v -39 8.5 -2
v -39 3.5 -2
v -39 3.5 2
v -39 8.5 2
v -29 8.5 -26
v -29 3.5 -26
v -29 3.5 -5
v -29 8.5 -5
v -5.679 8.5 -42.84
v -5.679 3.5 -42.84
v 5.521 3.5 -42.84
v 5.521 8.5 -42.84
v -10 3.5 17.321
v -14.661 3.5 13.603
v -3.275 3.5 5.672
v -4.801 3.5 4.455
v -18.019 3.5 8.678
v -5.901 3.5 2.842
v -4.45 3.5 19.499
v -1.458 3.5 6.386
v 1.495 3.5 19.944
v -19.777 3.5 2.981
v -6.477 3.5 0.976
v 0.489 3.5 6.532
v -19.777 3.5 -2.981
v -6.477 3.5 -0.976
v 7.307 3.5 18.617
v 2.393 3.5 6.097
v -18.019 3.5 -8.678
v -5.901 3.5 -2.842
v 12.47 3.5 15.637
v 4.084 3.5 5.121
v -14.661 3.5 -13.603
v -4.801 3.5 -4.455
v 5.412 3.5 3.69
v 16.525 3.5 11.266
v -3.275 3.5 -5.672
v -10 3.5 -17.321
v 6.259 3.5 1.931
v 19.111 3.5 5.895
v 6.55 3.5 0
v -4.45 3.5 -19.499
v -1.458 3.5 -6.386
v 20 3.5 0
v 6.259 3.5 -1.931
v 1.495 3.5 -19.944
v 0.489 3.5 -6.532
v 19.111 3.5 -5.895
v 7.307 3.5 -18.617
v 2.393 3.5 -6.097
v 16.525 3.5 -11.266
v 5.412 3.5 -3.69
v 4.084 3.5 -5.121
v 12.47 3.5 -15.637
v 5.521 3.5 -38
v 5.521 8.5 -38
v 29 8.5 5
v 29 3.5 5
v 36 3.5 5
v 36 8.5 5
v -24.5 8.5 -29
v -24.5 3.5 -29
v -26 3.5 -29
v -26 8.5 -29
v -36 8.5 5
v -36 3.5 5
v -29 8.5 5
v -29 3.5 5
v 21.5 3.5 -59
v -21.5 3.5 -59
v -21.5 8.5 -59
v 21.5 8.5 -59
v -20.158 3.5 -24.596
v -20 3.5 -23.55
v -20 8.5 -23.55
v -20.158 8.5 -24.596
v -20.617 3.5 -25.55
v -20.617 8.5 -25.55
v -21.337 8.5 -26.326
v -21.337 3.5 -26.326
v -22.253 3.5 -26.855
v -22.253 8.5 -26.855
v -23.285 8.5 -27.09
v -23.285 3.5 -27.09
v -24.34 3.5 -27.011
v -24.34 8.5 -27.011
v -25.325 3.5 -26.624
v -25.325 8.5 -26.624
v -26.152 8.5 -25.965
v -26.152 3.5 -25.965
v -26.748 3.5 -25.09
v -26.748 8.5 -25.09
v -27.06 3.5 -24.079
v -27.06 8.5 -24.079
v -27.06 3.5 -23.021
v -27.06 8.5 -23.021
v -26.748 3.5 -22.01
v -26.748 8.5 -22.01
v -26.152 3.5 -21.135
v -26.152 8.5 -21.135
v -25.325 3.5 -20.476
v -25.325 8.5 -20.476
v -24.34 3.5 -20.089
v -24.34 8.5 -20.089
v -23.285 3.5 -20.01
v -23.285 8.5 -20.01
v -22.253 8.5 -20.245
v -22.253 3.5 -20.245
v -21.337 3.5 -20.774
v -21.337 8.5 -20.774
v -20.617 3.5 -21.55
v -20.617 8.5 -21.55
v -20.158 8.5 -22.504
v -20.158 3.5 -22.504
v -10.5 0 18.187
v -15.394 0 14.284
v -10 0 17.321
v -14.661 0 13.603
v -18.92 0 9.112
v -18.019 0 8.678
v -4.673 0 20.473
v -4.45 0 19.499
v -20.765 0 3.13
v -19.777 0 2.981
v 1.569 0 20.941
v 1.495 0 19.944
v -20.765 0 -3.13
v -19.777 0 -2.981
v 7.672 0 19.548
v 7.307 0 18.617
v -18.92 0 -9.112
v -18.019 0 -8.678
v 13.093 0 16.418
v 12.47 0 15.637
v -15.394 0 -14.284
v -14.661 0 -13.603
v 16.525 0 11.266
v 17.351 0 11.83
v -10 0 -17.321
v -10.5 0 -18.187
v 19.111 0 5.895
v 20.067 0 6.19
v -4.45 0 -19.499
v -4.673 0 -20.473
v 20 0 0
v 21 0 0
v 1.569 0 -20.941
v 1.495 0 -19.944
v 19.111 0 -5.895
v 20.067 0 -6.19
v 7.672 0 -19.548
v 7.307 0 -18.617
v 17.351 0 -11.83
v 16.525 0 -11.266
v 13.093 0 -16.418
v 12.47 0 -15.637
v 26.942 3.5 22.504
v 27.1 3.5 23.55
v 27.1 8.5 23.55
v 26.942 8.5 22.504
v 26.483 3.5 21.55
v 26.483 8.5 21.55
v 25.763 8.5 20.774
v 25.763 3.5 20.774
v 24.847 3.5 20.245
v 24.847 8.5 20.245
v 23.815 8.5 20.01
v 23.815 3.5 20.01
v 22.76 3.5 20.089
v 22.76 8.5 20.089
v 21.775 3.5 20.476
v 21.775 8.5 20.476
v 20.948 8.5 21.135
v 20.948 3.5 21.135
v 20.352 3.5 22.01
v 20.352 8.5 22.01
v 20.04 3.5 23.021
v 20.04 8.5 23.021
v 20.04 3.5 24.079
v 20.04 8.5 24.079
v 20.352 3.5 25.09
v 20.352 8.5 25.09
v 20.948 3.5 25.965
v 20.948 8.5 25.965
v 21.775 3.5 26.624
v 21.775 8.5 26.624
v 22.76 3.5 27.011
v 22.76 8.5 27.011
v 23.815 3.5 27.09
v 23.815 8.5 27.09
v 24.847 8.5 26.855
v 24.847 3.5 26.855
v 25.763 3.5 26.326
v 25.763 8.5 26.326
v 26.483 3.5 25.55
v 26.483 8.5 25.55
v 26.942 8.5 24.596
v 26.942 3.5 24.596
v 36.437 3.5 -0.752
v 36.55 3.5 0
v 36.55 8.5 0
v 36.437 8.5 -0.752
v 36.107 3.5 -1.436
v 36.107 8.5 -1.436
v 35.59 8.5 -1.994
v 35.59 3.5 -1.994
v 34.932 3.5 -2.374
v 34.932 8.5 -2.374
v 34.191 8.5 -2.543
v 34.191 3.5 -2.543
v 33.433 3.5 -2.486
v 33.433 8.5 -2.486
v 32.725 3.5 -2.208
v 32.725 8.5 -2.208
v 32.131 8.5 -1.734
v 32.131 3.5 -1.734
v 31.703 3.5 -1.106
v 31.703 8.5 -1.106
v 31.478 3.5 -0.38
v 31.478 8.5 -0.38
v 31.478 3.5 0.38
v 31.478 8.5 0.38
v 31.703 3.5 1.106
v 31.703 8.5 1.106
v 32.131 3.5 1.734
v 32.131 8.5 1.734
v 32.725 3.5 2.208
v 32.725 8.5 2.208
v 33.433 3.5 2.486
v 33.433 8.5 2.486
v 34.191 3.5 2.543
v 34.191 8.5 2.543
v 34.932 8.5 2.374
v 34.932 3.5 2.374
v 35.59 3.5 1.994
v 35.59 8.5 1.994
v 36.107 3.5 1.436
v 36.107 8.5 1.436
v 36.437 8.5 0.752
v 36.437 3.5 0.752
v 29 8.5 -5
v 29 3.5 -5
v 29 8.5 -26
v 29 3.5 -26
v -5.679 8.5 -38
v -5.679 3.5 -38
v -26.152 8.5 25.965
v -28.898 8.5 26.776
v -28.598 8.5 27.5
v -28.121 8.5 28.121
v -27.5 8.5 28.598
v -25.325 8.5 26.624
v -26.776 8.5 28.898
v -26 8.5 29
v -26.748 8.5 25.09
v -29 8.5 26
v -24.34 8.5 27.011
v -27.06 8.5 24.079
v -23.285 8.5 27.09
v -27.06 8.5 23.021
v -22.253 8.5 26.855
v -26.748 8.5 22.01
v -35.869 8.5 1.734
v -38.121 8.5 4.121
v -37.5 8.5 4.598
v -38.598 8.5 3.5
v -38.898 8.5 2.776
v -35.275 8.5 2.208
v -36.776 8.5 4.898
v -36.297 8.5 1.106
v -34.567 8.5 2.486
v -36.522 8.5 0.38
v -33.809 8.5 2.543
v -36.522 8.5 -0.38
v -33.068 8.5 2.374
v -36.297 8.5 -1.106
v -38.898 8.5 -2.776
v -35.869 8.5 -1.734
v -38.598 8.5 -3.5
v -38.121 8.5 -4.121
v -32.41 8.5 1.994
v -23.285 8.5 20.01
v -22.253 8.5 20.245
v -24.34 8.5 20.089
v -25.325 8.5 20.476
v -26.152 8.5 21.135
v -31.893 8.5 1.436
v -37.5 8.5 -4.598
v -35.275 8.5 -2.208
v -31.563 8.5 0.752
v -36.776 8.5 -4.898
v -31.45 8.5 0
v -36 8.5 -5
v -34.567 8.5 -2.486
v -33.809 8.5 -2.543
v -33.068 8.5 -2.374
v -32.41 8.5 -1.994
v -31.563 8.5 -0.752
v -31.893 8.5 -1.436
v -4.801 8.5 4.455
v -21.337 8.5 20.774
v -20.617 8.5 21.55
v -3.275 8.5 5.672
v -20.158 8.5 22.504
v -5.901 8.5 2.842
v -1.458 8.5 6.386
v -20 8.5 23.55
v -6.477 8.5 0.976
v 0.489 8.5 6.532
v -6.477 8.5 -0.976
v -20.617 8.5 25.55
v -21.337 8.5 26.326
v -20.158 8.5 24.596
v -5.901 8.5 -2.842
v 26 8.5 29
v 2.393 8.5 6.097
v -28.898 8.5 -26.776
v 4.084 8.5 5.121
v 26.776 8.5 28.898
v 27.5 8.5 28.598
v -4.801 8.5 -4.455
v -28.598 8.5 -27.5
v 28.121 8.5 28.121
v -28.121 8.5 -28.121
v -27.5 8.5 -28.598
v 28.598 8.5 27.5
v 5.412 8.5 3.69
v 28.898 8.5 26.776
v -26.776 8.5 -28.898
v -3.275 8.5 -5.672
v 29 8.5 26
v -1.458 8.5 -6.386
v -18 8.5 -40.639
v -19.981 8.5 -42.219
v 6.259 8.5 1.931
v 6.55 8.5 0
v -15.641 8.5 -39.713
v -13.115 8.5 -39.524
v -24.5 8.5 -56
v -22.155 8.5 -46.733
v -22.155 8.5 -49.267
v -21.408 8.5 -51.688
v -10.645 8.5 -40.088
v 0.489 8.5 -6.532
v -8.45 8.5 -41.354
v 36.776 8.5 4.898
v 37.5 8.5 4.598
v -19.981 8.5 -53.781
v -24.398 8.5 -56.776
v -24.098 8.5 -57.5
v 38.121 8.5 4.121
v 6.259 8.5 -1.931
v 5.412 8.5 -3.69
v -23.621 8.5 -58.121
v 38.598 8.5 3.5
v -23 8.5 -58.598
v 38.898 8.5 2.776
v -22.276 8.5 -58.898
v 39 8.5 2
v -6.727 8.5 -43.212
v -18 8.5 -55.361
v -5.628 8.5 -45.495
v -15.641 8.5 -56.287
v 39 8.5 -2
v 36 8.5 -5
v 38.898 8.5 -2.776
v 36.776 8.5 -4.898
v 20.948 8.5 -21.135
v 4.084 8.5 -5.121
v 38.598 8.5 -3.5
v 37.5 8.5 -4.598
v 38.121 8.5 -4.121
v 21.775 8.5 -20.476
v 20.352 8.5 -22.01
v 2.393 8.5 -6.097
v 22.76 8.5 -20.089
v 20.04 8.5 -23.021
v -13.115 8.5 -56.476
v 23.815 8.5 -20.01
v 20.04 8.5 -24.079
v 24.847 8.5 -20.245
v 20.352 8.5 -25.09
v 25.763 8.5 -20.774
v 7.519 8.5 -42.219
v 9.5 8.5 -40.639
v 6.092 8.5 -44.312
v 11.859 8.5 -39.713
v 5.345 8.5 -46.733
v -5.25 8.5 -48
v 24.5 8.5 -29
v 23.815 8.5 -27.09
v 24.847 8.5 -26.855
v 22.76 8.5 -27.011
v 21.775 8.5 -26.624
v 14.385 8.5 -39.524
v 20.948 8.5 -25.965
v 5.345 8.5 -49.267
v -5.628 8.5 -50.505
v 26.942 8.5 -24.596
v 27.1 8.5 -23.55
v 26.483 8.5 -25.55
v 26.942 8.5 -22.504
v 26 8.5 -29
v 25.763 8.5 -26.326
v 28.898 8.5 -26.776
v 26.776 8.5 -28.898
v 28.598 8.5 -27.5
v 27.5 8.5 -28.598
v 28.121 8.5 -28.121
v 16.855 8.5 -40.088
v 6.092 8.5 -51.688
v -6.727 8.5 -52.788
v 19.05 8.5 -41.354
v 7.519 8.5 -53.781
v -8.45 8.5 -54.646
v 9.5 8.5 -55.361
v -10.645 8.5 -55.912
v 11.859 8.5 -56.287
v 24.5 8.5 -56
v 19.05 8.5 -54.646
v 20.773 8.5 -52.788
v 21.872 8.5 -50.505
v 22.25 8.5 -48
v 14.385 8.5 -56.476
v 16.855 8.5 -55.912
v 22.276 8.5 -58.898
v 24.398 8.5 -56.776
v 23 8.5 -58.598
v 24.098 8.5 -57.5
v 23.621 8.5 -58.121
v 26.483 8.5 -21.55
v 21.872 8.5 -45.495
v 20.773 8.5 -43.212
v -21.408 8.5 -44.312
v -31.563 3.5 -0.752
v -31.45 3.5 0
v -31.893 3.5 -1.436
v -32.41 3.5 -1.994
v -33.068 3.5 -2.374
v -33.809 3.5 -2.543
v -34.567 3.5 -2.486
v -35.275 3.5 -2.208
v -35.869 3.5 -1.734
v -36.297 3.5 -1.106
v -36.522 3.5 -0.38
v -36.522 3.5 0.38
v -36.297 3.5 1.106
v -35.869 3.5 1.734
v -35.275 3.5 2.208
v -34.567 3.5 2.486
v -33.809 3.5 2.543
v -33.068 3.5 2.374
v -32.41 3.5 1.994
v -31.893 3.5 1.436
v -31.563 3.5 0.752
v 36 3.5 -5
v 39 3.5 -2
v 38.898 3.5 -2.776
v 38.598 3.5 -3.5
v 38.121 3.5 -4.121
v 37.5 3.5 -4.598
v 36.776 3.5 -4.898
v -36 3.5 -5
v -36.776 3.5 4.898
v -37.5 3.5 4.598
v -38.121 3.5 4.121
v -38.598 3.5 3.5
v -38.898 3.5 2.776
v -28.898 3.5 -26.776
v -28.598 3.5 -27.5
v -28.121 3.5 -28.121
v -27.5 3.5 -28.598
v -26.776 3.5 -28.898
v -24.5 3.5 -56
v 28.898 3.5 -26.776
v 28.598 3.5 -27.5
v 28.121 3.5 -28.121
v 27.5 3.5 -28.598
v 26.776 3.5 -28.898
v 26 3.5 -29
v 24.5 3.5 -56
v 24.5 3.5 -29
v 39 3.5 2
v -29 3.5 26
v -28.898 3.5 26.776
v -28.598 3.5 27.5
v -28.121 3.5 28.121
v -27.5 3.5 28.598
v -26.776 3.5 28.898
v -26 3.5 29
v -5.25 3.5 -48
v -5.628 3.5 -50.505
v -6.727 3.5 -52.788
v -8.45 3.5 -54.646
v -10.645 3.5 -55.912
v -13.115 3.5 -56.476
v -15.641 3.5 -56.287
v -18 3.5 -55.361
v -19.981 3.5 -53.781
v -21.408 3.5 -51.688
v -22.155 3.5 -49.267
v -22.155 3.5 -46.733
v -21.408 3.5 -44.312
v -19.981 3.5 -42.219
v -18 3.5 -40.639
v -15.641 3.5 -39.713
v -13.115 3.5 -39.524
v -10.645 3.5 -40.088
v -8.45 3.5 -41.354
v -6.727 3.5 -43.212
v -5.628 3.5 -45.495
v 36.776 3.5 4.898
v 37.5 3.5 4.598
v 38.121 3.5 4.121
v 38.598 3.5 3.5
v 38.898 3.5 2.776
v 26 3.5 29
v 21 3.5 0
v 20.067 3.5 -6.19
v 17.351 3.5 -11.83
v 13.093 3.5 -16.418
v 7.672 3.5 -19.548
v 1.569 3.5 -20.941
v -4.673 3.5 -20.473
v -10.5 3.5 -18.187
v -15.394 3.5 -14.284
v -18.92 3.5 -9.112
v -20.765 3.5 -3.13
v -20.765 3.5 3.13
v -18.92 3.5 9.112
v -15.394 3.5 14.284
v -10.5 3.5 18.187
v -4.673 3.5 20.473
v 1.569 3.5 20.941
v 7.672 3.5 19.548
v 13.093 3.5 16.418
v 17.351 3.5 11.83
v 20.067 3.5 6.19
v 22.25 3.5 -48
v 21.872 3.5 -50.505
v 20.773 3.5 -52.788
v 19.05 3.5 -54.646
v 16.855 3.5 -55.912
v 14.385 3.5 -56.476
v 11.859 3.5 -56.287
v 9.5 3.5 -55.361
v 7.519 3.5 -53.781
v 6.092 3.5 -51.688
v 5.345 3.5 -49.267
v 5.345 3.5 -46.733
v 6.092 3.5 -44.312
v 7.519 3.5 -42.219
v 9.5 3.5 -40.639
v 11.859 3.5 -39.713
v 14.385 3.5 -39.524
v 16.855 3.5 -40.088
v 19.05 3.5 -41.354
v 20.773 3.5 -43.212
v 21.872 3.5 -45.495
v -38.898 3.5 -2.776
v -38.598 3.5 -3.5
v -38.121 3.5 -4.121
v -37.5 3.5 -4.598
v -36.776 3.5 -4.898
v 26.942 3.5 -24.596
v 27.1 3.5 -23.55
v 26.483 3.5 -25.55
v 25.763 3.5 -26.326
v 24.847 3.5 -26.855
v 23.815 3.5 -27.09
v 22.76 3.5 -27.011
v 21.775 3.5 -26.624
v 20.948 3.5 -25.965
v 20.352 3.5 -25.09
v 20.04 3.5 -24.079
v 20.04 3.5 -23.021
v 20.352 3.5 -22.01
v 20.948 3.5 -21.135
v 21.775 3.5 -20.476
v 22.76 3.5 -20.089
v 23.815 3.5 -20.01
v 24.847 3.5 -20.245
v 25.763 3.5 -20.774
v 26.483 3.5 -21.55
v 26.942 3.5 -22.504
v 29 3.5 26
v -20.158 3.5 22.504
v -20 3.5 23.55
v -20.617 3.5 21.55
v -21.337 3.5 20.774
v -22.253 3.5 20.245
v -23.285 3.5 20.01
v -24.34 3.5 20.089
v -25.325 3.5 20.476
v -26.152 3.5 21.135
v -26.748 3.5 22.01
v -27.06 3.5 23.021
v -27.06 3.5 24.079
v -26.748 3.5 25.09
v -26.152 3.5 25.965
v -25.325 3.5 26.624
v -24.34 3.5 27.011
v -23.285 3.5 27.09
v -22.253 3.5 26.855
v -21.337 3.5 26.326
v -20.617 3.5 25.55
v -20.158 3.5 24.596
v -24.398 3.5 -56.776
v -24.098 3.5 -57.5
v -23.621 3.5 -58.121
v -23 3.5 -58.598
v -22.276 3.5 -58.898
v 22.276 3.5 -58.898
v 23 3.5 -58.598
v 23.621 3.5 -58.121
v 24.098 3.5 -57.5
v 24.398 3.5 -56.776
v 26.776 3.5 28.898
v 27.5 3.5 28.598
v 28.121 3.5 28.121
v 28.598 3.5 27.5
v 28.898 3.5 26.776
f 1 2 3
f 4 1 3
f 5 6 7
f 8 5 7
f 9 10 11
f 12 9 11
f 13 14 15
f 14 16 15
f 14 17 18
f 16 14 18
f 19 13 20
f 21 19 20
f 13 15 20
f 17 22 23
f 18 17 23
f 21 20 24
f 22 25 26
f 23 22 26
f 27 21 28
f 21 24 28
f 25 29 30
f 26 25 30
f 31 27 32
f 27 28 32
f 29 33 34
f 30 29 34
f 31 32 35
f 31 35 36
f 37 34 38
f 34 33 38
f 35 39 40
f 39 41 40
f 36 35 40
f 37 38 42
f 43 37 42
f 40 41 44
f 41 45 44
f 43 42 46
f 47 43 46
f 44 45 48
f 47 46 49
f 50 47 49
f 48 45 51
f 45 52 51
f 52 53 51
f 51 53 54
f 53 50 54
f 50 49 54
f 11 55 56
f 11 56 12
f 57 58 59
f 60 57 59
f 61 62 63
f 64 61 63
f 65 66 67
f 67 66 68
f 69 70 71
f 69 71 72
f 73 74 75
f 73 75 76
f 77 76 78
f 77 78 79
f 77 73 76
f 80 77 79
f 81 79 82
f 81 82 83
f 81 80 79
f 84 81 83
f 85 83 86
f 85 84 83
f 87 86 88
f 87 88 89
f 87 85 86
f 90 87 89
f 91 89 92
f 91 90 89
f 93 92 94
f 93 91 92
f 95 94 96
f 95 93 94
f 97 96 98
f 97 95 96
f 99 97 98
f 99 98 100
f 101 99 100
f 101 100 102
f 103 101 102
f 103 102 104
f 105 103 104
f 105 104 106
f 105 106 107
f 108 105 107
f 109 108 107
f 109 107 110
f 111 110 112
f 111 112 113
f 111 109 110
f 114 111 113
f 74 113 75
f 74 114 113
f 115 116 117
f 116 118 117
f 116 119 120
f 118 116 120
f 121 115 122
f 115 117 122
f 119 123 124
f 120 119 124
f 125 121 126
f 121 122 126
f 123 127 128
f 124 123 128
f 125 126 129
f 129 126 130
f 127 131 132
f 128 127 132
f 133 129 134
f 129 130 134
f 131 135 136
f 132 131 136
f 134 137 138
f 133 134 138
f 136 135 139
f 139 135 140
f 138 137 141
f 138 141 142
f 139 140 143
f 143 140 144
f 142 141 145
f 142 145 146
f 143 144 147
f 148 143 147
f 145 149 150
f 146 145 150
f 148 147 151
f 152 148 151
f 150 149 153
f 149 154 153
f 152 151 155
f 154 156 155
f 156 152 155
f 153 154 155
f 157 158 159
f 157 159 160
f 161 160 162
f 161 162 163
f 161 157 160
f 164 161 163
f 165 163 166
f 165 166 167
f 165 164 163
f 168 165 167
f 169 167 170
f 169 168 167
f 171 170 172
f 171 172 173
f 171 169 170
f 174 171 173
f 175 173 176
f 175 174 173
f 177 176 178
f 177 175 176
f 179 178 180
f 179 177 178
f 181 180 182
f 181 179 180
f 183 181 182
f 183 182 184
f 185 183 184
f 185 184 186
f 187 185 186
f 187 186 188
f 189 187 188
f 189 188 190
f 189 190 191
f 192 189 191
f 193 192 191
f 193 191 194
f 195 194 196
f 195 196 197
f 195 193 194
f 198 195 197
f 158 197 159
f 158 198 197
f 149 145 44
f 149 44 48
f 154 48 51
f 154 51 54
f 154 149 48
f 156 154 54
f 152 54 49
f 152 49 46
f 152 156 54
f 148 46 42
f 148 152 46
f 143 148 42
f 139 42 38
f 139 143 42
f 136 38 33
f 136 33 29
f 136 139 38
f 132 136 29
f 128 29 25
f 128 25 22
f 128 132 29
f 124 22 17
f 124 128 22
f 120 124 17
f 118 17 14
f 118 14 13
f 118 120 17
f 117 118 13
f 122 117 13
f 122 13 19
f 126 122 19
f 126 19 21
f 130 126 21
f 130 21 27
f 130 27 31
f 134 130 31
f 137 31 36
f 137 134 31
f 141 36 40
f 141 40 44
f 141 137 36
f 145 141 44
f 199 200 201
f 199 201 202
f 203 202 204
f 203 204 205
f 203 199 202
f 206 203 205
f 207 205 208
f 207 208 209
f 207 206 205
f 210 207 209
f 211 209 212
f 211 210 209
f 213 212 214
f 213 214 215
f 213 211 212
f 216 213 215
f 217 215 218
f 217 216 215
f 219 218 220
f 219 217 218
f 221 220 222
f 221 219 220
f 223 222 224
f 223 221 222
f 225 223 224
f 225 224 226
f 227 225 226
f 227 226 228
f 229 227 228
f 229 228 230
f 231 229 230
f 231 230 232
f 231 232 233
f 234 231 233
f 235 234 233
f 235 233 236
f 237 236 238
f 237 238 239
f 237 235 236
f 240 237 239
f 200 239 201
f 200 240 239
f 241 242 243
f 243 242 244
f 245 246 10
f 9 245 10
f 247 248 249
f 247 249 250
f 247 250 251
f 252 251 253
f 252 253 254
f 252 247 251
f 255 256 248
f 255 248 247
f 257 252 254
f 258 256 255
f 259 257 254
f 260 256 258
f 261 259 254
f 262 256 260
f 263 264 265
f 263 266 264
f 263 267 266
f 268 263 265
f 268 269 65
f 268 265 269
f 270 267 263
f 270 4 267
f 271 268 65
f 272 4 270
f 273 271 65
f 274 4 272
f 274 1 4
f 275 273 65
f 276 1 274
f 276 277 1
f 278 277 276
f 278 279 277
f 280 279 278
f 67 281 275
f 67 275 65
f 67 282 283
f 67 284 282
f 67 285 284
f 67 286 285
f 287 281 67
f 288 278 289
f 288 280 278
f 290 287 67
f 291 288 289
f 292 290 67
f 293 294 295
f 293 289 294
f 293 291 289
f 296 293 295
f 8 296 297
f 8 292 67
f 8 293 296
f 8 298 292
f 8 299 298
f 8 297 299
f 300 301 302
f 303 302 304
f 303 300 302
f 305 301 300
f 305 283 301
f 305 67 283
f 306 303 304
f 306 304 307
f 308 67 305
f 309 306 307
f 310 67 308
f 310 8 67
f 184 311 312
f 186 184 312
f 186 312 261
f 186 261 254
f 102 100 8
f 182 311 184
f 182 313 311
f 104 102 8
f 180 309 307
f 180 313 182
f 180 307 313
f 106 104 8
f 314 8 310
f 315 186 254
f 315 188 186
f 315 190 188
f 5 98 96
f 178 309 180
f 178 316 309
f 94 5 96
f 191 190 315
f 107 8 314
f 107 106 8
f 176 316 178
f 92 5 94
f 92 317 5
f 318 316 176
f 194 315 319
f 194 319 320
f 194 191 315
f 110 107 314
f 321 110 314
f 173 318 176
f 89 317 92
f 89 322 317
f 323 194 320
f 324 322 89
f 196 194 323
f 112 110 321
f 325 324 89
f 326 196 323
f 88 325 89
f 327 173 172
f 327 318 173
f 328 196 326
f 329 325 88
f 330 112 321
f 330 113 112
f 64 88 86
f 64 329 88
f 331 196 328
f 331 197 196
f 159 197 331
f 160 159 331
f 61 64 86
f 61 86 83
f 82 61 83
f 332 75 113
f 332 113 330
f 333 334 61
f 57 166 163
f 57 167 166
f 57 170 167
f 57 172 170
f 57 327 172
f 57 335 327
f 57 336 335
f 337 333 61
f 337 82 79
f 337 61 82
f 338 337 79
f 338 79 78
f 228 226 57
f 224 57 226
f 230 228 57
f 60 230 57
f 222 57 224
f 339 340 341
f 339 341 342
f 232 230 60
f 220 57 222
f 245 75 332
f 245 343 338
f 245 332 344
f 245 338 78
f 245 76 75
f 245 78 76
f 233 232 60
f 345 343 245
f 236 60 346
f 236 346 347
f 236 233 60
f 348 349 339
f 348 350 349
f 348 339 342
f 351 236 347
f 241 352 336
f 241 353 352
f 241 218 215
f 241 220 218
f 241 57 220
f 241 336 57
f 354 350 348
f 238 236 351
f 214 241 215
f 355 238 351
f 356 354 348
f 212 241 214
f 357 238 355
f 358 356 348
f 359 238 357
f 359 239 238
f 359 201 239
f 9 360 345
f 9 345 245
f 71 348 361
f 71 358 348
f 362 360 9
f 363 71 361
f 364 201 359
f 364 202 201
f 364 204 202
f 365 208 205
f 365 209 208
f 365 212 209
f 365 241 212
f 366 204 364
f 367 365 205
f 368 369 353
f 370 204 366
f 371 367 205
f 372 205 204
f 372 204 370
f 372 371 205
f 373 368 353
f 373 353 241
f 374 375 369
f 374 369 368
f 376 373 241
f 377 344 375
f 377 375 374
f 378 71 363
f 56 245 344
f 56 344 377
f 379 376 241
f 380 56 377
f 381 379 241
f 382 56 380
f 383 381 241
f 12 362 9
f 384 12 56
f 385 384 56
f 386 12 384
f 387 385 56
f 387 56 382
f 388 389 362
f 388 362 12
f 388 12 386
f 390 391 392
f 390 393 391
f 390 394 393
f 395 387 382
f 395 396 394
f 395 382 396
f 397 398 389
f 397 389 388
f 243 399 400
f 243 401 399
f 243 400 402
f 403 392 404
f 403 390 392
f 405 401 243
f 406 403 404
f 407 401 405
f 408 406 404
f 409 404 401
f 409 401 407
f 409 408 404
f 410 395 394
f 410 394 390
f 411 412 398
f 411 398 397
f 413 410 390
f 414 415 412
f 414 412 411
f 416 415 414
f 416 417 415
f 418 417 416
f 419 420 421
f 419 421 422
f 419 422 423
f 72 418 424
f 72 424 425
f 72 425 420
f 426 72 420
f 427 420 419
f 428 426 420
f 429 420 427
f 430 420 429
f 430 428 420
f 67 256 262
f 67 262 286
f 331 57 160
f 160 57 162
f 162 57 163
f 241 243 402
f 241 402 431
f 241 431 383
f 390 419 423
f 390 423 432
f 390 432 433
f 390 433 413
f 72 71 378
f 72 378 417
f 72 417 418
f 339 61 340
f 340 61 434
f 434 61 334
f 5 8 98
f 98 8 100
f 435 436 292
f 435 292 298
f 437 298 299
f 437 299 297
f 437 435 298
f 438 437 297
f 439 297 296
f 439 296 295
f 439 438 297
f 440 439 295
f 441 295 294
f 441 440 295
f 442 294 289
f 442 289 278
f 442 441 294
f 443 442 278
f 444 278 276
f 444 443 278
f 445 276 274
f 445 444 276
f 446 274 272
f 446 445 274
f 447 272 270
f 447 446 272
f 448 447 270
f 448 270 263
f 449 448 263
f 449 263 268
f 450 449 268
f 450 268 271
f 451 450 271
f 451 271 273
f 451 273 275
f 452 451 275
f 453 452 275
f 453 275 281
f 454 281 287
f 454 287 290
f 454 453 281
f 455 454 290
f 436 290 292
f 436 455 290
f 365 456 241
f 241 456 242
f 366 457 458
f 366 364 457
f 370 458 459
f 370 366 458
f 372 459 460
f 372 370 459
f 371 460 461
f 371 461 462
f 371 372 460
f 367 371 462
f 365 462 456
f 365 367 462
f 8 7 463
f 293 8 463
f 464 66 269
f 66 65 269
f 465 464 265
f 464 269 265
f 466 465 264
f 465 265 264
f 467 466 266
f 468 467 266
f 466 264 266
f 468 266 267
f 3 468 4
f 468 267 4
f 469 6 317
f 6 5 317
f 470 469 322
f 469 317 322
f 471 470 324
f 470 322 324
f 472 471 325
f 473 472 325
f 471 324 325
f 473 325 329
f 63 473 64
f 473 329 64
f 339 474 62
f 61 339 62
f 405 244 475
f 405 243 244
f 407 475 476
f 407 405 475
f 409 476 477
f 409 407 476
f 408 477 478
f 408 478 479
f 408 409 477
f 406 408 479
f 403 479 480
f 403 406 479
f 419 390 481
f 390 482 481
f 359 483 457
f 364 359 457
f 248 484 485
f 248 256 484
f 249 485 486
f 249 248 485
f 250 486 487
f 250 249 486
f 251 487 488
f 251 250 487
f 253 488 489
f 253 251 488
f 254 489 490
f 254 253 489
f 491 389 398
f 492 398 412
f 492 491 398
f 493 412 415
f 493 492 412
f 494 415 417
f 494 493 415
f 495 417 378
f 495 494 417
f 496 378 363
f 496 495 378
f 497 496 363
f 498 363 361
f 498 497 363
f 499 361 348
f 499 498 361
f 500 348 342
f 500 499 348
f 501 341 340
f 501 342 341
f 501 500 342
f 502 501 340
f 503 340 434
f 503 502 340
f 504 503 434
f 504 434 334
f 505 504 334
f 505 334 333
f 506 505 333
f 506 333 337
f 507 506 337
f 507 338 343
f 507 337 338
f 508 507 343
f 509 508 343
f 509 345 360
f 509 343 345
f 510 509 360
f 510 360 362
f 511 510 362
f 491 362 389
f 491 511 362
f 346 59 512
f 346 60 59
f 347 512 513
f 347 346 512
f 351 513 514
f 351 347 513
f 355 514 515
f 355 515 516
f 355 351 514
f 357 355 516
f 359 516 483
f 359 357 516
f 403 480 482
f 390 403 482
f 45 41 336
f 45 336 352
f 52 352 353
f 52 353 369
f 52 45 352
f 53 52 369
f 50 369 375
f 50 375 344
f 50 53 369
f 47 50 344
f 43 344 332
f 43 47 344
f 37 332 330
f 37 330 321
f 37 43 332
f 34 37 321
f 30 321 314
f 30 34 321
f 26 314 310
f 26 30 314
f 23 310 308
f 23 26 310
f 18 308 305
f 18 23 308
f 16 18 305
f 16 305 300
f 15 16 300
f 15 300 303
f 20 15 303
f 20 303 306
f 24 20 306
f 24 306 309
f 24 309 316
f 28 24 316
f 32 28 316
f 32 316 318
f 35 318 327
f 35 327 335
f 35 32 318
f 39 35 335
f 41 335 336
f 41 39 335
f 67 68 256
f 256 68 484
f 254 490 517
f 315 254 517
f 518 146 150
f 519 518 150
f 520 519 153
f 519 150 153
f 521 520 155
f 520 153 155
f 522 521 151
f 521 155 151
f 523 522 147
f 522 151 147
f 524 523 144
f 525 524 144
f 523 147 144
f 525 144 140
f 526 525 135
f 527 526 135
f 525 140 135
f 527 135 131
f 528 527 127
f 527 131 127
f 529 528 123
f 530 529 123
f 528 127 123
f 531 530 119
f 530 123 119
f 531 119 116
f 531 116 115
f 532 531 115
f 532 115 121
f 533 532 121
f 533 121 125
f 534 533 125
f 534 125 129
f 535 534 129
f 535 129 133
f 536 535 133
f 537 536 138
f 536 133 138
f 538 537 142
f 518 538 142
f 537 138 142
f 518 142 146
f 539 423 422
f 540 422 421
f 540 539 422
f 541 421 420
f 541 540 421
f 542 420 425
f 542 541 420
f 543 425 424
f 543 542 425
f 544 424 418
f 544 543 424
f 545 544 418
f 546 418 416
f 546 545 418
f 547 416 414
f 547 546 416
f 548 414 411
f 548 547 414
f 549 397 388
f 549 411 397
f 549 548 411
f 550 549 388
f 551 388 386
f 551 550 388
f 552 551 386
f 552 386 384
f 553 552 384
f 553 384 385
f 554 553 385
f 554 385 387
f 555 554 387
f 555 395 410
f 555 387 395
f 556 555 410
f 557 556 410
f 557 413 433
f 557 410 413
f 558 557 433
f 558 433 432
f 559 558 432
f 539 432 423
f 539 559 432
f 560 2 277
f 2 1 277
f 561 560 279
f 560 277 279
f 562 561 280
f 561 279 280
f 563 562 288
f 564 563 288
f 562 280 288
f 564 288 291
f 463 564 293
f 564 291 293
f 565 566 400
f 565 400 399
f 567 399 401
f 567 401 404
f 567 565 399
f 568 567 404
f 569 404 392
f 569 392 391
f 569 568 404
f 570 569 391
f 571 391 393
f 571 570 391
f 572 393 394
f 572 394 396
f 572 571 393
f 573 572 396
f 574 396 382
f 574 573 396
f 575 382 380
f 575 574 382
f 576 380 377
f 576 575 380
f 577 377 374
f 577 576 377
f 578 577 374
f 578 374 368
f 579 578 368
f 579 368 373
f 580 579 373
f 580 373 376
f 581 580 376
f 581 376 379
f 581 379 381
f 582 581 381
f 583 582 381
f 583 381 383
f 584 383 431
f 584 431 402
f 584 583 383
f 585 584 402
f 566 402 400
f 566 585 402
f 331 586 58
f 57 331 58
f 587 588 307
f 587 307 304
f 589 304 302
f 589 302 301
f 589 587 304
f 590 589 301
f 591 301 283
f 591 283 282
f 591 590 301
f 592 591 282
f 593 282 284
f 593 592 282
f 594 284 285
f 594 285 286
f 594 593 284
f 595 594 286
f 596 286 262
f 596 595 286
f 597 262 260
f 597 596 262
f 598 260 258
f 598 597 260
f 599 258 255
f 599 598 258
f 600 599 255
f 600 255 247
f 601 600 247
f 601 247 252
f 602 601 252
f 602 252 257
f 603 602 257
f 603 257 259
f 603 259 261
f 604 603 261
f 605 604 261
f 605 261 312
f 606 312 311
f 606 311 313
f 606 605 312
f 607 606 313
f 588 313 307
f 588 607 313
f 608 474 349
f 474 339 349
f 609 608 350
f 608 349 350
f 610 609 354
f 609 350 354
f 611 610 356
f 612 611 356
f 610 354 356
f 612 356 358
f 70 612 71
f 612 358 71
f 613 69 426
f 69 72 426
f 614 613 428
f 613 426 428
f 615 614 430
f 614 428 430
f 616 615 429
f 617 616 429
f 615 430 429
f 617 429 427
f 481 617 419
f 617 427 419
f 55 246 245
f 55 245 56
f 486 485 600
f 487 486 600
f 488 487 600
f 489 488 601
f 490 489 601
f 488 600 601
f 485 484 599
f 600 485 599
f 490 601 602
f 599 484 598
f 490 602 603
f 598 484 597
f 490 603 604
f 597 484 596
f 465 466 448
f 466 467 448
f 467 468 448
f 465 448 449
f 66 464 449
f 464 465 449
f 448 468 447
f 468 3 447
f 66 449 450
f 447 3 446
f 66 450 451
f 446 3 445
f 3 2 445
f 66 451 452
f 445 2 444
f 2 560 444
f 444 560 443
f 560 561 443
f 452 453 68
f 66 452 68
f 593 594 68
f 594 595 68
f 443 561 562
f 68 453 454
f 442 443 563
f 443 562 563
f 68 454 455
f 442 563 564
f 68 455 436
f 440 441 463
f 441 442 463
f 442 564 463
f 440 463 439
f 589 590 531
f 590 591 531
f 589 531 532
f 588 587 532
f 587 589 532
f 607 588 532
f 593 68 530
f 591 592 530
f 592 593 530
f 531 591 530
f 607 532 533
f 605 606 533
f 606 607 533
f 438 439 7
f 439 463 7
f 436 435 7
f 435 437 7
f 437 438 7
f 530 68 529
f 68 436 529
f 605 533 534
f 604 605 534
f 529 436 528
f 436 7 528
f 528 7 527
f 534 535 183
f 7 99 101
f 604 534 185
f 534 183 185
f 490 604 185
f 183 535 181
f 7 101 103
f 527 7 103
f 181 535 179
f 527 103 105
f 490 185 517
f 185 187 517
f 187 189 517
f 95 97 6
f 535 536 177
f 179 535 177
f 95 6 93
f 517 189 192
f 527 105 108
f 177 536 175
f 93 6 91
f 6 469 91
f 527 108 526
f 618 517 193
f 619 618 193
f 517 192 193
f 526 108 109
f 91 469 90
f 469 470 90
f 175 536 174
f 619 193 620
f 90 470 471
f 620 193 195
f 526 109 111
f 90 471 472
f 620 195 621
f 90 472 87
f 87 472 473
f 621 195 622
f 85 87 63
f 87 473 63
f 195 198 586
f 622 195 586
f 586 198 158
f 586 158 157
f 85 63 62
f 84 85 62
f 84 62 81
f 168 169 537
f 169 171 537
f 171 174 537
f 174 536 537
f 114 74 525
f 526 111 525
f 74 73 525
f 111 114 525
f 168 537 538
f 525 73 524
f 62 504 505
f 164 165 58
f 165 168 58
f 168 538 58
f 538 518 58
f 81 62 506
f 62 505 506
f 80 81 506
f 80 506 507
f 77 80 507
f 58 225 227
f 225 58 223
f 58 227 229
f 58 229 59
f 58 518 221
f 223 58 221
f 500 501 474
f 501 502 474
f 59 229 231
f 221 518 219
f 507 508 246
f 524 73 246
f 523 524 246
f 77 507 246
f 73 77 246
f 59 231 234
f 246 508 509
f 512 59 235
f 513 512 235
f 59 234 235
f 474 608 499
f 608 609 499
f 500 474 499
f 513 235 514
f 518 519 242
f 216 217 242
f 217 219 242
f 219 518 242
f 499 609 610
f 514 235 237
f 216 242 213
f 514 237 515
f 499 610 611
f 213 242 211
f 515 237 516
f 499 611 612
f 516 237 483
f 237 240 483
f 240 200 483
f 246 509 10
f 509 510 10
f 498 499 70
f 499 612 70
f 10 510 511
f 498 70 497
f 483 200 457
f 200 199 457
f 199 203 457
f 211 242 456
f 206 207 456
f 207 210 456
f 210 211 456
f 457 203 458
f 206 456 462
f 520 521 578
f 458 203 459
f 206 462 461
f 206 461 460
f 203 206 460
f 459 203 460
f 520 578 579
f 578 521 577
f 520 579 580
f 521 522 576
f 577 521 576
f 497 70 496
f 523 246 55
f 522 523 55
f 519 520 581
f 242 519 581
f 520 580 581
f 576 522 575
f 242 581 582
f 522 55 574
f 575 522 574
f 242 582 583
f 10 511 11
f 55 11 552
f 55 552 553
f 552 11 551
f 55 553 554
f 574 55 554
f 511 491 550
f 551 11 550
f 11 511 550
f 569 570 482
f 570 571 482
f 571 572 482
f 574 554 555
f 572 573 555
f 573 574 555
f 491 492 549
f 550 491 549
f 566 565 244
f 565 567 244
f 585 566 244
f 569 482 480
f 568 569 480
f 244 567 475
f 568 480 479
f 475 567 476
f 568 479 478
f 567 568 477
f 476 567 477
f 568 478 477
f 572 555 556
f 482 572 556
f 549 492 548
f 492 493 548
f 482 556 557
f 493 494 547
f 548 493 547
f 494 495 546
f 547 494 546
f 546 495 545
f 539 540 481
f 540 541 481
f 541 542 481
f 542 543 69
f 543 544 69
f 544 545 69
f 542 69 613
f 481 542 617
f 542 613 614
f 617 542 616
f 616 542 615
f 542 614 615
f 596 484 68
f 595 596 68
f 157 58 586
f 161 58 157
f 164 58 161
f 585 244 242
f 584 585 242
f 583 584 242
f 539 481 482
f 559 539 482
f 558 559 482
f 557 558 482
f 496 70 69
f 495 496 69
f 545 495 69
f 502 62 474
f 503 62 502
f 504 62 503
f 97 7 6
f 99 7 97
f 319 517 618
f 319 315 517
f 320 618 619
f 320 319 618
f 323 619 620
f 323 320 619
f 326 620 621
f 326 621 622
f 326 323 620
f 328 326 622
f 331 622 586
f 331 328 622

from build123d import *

# Parameters (mm, degrees)
SKETCH1_R           = 21
SKETCH1_R_2         = 20
BOSS_EXTRUDE1_DEPTH = 3.5
SKETCH2_R           = 3.55
SKETCH2_R_2         = 6.55
SKETCH2_R_3         = 2.55
SKETCH2_R_4         = 8.5
SKETCH2_W           = 11.2
SKETCH2_H           = 4.84
BOSS_EXTRUDE2_DEPTH = 5
SKETCH3_W           = 11.2
SKETCH3_H           = 4.84
SKETCH3_W_2         = 49
SKETCH3_H_2         = 8
SKETCH3_R           = 8.5
IGNORE_DEPTH        = 5
SKETCH4_R           = 8.5
SKETCH4_W           = 11.2
SKETCH4_H           = 4.84
CUT_EXTRUDE2_DEPTH  = 6
FILLET1_R           = 3


with BuildPart() as part:
    # Sketch1 → Boss-Extrude1 (new body)
    with BuildSketch(Plane(origin=(0, 0, 0), x_dir=(1, 0, 0), z_dir=(0, 1, 0))):
        Circle(SKETCH1_R)
        Circle(SKETCH1_R_2, mode=Mode.SUBTRACT)
    extrude(amount=BOSS_EXTRUDE1_DEPTH)

    # Sketch2 → Boss-Extrude2 (add)
    with BuildSketch(Plane(origin=(0, 3.5, 0), x_dir=(1, 0, 0), z_dir=(0, 1, 0))):
        Polygon((-29, -5), (-29, -29), (29, -29), (29, -5), (39, -5), (39, 5), (29, 5), (29, 29), (24.5, 29), (24.5, 51), (-24.5, 51), (-24.5, 29), (-29, 29), (-29, 5), (-39, 5), (-39, -5), align=None)
        with Locations((-23.55, -23.55)):
            Circle(SKETCH2_R, mode=Mode.SUBTRACT)
        with Locations((23.55, -23.55)):
            Circle(SKETCH2_R, mode=Mode.SUBTRACT)
        Circle(SKETCH2_R_2, mode=Mode.SUBTRACT)
        with Locations((-23.55, 23.55)):
            Circle(SKETCH2_R, mode=Mode.SUBTRACT)
        with Locations((23.55, 23.55)):
            Circle(SKETCH2_R, mode=Mode.SUBTRACT)
        with Locations((-34, 0)):
            Circle(SKETCH2_R_3, mode=Mode.SUBTRACT)
        with Locations((34, 0)):
            Circle(SKETCH2_R_3, mode=Mode.SUBTRACT)
        with Locations((13.76, 39)):
            Circle(SKETCH2_R_4, mode=Mode.SUBTRACT)
        with Locations((-13.76, 39)):
            Circle(SKETCH2_R_4, mode=Mode.SUBTRACT)
        with Locations((0, 46.28)):
            Rectangle(SKETCH2_W, SKETCH2_H, mode=Mode.SUBTRACT)
    extrude(amount=BOSS_EXTRUDE2_DEPTH)

    # Sketch3 → Ignore (add)
    with BuildSketch(Plane(origin=(0, 3.5, 0), x_dir=(1, 0, 0), z_dir=(0, 1, 0))):
        with Locations((0, 46.28)):
            Rectangle(SKETCH3_W, SKETCH3_H)
        with Locations((0, 55)):
            Rectangle(SKETCH3_W_2, SKETCH3_H_2)
        with Locations((13.76, 39)):
            Circle(SKETCH3_R)
        with Locations((-13.76, 39)):
            Circle(SKETCH3_R)
    extrude(amount=IGNORE_DEPTH)

    # Sketch4 → Cut-Extrude2 (cut, through all)
    with BuildSketch(Plane(origin=(0, 3.5, 0), x_dir=(1, 0, 0), z_dir=(0, 1, 0))):
        with Locations((-13.75, 48)):
            Circle(SKETCH4_R)
        with Locations((13.75, 48)):
            Circle(SKETCH4_R)
        with Locations((-0.079148889, 40.42)):
            Rectangle(SKETCH4_W, SKETCH4_H)
    extrude(amount=CUT_EXTRUDE2_DEPTH, mode=Mode.SUBTRACT)

    # Fillet1
    fillet1_edges = [part.edges().sort_by_distance(p)[0] for p in [
        (-29, 6, 29),
        (29, 6, 29),
        (39, 6, 5),
        (39, 6, -5),
        (29, 6, -29),
        (-29, 6, -29),
        (-39, 6, -5),
        (-39, 6, 5),
        (24.5, 6, -59),
        (-24.5, 6, -59),
    ]]
    fillet(fillet1_edges, radius=FILLET1_R)


solid = part.part
